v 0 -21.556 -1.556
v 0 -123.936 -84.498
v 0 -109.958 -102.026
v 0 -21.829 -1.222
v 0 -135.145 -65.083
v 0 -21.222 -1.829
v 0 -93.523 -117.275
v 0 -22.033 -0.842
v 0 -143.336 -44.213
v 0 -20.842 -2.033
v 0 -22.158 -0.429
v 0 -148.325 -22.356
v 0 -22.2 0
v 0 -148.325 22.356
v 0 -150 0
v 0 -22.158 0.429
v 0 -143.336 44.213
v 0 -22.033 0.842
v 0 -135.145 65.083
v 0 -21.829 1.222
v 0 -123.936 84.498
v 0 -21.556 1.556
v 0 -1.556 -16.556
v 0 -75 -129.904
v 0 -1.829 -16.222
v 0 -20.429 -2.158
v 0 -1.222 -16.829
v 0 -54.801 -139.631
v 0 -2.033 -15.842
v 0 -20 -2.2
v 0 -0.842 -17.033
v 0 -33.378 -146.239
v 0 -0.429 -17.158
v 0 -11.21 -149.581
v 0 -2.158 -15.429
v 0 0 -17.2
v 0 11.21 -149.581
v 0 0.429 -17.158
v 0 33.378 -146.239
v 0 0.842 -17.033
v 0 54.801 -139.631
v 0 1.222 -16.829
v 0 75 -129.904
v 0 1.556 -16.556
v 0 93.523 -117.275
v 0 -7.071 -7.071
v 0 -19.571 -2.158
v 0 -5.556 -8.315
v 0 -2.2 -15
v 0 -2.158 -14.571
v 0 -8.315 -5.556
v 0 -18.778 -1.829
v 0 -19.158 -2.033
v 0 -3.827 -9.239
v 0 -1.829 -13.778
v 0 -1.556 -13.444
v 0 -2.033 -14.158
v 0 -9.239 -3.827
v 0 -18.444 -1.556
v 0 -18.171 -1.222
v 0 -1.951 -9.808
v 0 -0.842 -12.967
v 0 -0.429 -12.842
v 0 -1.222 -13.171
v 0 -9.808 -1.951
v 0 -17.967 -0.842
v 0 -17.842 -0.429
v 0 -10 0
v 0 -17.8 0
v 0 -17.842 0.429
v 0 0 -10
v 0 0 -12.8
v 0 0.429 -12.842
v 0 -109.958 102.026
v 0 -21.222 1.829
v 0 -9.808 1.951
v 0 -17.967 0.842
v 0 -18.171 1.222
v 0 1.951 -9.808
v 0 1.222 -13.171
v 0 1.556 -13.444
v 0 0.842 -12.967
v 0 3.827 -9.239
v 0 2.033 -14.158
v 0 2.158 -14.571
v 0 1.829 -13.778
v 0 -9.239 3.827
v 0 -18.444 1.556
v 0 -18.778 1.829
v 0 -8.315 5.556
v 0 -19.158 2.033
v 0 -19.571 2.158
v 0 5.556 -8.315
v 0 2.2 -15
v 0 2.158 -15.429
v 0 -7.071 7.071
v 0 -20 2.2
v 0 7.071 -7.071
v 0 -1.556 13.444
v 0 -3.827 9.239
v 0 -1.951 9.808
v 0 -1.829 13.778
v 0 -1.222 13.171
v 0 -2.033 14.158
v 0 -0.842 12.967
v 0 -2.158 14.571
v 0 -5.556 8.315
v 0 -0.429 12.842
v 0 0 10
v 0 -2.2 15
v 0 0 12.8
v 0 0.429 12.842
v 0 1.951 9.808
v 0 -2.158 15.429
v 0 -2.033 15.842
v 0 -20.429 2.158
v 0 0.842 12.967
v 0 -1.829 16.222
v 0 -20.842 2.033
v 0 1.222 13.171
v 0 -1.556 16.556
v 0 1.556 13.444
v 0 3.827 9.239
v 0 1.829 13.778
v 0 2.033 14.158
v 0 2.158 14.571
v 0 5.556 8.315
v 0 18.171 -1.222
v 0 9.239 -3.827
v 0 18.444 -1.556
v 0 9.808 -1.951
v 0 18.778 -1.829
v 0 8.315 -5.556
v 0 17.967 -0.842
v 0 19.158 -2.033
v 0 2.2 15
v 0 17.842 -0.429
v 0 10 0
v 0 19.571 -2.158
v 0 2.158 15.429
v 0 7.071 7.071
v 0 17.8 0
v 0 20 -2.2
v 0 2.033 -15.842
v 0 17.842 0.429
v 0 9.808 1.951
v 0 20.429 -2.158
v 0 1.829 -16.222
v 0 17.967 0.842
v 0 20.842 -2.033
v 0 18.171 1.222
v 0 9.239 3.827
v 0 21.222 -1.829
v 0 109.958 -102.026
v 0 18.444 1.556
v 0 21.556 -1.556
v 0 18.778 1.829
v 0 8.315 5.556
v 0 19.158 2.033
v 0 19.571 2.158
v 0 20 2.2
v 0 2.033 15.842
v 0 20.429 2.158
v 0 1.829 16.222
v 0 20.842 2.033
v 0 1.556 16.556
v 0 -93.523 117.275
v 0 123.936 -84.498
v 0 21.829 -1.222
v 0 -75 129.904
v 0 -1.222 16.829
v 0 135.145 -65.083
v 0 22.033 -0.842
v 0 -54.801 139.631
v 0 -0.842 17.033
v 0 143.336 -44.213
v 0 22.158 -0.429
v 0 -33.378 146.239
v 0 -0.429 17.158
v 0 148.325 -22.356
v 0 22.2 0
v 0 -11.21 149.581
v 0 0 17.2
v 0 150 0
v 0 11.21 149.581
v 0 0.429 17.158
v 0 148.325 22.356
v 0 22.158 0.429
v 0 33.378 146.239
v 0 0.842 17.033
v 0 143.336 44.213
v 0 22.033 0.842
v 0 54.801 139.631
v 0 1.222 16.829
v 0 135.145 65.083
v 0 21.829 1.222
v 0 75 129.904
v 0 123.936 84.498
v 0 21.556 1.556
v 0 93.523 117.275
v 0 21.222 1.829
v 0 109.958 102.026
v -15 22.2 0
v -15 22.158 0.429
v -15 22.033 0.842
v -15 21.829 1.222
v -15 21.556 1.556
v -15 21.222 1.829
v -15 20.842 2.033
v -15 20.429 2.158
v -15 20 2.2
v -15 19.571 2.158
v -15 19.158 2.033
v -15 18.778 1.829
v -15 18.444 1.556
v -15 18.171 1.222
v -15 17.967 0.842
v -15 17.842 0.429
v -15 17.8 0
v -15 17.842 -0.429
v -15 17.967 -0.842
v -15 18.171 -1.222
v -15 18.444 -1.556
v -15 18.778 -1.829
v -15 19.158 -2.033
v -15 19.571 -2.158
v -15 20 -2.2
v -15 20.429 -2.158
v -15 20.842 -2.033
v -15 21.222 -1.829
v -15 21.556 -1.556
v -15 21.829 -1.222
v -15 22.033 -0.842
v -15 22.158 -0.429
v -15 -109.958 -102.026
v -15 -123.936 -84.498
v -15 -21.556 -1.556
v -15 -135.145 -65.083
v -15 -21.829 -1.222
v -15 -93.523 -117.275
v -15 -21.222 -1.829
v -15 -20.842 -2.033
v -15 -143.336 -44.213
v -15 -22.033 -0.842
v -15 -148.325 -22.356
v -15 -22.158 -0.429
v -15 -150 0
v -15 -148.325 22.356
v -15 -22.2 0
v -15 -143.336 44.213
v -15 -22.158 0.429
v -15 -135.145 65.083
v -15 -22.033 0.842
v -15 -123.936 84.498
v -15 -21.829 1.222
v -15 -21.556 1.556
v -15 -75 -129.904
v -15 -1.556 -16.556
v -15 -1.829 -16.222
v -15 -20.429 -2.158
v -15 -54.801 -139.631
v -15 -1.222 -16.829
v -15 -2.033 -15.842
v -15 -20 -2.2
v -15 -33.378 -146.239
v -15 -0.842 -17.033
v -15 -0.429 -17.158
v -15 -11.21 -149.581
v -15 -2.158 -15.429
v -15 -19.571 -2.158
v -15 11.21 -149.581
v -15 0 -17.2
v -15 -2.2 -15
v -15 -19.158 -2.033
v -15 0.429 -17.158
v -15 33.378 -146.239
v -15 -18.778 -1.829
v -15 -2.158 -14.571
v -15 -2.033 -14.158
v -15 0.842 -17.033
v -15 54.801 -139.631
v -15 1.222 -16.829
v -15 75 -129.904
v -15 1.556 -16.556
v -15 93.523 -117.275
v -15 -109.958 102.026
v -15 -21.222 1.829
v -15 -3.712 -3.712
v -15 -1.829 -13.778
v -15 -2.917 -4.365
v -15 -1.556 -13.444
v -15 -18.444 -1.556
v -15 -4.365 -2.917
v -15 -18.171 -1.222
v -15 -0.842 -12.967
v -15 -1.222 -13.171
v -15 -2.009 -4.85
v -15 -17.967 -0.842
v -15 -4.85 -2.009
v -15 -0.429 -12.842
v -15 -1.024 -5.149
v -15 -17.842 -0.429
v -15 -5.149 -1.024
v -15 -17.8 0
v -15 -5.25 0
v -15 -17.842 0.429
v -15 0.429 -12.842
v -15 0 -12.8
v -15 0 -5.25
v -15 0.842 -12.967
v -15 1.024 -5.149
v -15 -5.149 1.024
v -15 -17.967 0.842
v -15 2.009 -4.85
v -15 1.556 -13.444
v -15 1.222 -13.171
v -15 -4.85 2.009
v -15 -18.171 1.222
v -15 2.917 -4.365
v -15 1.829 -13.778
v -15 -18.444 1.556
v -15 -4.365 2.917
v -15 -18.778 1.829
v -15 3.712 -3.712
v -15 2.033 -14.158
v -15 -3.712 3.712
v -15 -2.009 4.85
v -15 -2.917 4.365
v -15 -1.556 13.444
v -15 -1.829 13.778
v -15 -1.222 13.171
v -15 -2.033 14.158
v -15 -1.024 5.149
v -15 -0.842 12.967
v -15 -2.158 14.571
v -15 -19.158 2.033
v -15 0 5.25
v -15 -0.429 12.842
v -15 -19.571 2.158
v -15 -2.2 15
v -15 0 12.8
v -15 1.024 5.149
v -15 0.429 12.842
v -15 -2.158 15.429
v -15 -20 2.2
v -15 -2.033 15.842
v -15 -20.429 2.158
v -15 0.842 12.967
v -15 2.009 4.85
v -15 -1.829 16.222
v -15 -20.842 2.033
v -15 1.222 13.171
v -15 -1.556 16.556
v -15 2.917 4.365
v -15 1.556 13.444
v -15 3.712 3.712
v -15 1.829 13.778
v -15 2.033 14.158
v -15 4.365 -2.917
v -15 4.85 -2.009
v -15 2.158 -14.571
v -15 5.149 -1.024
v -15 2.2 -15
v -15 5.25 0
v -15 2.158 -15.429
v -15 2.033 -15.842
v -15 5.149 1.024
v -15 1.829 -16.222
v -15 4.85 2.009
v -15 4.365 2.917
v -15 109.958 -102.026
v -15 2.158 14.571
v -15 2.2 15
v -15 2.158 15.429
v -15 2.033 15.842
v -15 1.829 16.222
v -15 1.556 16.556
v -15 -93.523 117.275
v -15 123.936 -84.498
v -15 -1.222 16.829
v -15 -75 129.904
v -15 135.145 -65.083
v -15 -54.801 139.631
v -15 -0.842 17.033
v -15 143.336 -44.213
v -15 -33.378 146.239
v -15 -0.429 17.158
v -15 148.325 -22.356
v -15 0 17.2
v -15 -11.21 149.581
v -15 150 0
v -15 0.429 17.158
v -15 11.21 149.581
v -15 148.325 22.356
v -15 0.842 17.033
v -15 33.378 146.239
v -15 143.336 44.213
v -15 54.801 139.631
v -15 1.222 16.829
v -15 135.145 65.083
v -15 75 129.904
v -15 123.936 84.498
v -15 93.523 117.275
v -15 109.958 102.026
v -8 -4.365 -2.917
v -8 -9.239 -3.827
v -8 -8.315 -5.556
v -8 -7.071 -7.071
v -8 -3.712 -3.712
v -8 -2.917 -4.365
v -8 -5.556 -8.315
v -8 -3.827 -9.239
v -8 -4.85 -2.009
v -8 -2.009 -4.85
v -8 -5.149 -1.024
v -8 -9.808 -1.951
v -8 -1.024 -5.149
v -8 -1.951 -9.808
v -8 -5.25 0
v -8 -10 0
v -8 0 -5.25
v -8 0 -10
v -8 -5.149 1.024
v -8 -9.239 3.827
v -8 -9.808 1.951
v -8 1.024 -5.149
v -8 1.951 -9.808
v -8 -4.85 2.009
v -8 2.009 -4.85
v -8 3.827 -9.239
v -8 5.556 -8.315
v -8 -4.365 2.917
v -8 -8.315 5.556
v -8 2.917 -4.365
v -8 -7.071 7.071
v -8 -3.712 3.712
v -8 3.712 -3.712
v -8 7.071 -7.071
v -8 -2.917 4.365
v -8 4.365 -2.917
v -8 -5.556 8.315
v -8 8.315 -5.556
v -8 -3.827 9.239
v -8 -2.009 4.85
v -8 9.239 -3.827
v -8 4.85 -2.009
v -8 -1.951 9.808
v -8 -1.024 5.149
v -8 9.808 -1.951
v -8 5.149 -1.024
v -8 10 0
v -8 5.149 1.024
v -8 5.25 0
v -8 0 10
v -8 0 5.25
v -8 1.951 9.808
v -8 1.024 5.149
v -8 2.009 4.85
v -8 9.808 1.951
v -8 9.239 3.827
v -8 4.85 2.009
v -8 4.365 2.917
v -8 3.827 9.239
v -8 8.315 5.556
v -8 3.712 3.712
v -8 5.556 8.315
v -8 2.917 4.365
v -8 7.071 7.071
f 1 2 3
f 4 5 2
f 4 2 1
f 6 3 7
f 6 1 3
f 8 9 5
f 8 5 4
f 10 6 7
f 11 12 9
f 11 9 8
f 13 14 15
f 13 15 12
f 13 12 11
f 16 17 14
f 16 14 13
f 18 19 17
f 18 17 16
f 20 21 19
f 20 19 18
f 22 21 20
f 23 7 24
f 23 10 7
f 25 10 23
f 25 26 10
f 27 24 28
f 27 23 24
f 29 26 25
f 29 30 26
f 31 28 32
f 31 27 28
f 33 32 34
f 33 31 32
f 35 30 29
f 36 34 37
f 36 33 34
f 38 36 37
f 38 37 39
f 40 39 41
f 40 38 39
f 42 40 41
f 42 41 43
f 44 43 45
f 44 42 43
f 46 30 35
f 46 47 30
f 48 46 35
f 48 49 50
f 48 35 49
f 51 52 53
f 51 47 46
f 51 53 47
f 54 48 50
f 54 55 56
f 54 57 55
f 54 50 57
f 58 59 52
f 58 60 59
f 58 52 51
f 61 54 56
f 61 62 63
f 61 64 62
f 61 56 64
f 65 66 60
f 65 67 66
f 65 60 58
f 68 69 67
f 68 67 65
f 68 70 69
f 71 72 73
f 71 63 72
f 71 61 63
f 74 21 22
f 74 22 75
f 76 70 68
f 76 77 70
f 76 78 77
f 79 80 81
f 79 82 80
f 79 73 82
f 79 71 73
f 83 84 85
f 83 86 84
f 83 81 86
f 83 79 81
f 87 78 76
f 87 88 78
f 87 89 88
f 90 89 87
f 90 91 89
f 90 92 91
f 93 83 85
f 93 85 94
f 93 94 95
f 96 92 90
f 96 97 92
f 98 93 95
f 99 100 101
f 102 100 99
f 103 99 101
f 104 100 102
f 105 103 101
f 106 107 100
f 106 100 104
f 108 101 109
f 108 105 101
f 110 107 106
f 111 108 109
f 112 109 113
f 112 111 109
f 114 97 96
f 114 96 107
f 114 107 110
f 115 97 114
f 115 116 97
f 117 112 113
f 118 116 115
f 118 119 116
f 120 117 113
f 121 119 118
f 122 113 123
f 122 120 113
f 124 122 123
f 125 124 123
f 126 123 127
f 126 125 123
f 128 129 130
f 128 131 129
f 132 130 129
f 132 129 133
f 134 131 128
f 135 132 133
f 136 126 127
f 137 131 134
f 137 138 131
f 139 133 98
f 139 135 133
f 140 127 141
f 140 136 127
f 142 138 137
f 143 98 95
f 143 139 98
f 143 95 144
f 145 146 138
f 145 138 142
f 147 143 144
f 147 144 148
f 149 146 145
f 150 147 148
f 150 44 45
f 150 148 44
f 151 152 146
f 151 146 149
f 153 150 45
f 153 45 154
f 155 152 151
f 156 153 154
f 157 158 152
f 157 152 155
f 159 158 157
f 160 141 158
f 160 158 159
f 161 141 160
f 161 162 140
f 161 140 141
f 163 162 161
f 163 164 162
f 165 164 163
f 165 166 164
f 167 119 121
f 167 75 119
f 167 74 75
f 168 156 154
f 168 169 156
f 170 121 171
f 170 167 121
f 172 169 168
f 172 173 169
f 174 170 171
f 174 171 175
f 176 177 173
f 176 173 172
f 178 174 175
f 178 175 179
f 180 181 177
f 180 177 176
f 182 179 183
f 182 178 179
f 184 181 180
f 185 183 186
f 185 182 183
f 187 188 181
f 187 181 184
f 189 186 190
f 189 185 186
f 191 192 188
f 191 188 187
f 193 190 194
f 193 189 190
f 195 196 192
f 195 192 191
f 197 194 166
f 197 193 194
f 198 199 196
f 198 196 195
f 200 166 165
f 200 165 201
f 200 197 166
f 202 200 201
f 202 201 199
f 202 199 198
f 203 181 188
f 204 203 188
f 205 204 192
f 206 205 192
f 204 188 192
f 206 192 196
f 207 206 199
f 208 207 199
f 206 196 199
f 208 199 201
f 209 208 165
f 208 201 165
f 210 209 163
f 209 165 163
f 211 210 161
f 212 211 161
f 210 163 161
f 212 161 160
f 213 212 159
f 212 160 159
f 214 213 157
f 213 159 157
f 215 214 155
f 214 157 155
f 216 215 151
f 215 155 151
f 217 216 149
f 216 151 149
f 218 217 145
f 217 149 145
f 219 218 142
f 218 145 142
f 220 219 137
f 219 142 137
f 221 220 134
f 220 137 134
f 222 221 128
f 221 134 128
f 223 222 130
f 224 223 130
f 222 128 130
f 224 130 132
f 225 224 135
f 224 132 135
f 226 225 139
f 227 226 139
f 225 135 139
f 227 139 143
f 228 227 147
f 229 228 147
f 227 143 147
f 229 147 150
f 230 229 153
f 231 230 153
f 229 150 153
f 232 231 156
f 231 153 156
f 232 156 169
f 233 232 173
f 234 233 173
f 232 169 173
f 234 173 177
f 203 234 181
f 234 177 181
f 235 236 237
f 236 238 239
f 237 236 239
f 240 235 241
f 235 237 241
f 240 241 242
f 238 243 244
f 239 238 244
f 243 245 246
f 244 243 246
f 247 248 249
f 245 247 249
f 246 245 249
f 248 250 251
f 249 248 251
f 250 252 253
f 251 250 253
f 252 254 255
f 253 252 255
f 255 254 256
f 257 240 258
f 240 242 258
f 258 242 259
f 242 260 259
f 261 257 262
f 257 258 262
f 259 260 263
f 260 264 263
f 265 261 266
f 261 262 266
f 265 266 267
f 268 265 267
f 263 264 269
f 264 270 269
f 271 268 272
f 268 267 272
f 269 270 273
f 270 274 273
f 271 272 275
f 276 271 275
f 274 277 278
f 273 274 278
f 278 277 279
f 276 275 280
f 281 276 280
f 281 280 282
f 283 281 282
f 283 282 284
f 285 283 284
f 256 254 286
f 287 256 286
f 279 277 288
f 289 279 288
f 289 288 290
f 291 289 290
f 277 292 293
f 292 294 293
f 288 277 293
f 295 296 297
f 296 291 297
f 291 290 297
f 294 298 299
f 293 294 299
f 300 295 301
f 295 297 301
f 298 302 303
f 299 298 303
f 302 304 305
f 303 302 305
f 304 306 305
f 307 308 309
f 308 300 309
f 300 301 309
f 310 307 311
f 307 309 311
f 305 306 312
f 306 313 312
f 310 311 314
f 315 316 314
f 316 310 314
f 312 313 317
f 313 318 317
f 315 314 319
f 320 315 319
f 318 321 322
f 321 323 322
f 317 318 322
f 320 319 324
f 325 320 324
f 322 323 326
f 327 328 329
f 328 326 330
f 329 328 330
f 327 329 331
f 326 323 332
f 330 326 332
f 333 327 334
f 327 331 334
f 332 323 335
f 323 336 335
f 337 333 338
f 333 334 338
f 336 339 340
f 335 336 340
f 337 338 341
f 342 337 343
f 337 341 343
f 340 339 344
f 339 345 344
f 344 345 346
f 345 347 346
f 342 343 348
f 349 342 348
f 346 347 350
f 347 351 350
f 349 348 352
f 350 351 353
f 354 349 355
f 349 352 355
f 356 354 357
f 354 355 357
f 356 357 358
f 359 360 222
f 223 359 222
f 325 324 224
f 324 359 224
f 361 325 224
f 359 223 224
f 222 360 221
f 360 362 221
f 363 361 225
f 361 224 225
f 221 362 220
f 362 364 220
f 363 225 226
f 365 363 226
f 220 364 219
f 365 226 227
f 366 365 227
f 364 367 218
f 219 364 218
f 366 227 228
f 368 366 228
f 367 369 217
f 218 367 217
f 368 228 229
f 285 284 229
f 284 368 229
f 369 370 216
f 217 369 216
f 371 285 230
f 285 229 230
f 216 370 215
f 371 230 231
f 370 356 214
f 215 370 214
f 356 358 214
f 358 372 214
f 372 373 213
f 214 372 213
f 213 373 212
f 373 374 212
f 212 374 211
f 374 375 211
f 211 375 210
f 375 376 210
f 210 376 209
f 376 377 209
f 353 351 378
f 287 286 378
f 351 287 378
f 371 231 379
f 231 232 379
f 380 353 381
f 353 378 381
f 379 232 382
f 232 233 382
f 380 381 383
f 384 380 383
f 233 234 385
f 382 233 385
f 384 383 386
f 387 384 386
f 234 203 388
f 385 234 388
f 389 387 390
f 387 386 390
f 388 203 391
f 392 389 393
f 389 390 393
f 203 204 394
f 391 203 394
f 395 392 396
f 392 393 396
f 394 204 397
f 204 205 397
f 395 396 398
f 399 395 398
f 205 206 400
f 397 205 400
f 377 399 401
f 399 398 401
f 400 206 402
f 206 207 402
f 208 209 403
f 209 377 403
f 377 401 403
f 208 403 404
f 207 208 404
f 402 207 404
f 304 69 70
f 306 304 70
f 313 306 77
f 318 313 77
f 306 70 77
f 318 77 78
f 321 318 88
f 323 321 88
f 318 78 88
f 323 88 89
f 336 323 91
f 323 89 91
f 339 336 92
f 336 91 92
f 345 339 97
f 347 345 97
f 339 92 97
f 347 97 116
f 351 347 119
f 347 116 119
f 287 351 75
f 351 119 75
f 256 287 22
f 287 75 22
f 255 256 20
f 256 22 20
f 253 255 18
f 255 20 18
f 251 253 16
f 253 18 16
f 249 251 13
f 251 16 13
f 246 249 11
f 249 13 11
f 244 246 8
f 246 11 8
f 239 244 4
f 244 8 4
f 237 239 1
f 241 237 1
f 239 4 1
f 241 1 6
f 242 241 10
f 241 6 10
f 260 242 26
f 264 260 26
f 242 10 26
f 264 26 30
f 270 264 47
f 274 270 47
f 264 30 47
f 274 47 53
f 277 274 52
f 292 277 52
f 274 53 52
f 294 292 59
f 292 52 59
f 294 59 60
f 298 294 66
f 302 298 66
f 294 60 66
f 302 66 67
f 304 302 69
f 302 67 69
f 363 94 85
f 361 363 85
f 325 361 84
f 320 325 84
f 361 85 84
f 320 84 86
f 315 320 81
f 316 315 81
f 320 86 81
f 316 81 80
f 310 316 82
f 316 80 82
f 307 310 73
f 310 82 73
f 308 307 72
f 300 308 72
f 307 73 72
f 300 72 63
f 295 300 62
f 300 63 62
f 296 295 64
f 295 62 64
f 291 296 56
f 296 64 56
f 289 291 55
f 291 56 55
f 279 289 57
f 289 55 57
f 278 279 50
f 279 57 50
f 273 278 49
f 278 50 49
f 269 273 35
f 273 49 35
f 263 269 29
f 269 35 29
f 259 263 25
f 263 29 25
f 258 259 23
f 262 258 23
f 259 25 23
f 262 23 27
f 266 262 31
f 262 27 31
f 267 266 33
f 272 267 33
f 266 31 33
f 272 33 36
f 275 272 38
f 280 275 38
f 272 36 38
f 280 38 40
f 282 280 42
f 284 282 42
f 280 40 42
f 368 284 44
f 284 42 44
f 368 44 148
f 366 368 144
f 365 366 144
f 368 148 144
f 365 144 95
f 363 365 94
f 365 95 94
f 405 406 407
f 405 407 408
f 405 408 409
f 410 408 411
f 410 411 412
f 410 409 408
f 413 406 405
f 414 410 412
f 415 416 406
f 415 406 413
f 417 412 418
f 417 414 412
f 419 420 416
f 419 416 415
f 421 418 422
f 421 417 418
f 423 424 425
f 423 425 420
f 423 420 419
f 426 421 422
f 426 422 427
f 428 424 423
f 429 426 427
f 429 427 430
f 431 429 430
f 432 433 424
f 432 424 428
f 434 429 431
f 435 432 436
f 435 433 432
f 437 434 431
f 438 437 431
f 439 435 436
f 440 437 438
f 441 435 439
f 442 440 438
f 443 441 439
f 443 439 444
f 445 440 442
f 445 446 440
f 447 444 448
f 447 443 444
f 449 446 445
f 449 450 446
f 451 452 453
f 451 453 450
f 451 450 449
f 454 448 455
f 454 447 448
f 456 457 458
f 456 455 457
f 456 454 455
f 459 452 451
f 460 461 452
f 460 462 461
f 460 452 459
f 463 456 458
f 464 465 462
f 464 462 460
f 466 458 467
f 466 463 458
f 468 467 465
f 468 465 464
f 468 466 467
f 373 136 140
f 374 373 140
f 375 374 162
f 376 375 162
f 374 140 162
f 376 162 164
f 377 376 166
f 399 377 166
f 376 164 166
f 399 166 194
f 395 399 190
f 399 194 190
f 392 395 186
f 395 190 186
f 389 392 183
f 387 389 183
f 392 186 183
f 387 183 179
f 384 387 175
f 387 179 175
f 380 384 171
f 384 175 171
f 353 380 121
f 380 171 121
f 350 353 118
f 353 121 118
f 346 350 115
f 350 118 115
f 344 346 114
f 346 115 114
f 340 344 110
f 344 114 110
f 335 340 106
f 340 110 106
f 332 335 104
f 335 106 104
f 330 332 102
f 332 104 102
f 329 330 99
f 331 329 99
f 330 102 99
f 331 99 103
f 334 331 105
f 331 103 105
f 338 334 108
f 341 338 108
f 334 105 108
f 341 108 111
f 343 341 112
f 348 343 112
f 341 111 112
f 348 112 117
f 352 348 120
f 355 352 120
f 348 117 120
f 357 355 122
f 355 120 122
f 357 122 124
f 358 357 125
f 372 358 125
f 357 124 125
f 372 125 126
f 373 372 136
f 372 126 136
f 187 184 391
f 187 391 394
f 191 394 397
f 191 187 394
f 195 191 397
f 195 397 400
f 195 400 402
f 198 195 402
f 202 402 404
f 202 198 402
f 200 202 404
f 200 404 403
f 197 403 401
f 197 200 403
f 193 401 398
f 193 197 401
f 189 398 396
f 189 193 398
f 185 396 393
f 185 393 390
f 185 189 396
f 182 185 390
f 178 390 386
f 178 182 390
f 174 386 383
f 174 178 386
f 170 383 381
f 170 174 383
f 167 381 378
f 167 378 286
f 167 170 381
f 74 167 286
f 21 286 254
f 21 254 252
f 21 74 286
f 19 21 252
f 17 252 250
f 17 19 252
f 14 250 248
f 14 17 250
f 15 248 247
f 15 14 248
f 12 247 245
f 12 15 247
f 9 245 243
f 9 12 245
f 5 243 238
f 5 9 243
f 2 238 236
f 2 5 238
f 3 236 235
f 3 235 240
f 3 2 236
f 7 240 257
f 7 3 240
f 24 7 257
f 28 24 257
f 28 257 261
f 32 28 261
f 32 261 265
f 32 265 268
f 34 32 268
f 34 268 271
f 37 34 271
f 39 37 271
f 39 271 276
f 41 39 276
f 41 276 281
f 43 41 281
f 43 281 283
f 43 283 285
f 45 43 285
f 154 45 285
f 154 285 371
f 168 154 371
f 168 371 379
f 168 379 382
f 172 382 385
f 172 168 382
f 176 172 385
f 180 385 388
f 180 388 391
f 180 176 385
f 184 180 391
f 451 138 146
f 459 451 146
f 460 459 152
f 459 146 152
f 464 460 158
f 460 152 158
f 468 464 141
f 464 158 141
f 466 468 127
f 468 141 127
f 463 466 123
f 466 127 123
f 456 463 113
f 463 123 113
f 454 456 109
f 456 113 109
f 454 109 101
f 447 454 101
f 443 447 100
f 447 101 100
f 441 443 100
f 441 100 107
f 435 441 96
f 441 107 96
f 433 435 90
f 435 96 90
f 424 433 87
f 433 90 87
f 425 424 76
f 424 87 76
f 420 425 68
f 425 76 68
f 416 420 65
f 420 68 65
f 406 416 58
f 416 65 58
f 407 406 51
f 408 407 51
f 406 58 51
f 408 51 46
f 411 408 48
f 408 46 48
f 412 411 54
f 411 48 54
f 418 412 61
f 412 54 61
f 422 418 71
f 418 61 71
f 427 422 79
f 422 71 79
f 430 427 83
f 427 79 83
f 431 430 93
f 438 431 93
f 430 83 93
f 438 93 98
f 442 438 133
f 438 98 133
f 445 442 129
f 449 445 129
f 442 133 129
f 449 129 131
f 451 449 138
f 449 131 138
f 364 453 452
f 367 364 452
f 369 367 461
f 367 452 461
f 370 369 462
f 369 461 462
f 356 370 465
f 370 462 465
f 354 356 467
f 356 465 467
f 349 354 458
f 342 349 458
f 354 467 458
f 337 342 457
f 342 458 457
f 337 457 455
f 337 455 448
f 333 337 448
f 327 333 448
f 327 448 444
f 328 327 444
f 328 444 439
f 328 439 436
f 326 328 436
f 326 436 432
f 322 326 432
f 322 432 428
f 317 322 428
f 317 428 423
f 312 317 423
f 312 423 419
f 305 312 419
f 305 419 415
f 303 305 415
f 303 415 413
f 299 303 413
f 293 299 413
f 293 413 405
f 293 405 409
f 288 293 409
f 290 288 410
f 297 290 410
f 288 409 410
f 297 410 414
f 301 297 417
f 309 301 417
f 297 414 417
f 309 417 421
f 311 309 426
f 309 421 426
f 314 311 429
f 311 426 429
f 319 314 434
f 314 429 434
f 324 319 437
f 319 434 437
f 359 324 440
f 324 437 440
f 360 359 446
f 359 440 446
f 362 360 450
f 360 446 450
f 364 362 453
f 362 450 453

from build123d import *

# Parameters (mm, degrees)
F2_R     = 150
F2_R_2   = 2.2
F2_R_3   = 10
F2_R_4   = 5.25
F3_DEPTH = 15
F4_DEPTH = 8


with BuildPart() as f3:
    # F2 (on Right) → F3 (new body)
    with BuildSketch(Plane.YZ):
        Circle(F2_R)
        with Locations((0, -15)):
            Circle(F2_R_2, mode=Mode.SUBTRACT)
        with Locations((-20, 0)):
            Circle(F2_R_2, mode=Mode.SUBTRACT)
        Circle(F2_R_3, mode=Mode.SUBTRACT)
        with Locations((0, 15)):
            Circle(F2_R_2, mode=Mode.SUBTRACT)
        with Locations((20, 0)):
            Circle(F2_R_2, mode=Mode.SUBTRACT)
        Circle(F2_R_3)
        Circle(F2_R_4, mode=Mode.SUBTRACT)
    extrude(amount=-F3_DEPTH)

    # F2 (on Right) → F4 (cut)
    with BuildSketch(Plane.YZ):
        Circle(F2_R_3)
        Circle(F2_R_4, mode=Mode.SUBTRACT)
    extrude(amount=-F4_DEPTH, mode=Mode.SUBTRACT)


solid = f3.part
